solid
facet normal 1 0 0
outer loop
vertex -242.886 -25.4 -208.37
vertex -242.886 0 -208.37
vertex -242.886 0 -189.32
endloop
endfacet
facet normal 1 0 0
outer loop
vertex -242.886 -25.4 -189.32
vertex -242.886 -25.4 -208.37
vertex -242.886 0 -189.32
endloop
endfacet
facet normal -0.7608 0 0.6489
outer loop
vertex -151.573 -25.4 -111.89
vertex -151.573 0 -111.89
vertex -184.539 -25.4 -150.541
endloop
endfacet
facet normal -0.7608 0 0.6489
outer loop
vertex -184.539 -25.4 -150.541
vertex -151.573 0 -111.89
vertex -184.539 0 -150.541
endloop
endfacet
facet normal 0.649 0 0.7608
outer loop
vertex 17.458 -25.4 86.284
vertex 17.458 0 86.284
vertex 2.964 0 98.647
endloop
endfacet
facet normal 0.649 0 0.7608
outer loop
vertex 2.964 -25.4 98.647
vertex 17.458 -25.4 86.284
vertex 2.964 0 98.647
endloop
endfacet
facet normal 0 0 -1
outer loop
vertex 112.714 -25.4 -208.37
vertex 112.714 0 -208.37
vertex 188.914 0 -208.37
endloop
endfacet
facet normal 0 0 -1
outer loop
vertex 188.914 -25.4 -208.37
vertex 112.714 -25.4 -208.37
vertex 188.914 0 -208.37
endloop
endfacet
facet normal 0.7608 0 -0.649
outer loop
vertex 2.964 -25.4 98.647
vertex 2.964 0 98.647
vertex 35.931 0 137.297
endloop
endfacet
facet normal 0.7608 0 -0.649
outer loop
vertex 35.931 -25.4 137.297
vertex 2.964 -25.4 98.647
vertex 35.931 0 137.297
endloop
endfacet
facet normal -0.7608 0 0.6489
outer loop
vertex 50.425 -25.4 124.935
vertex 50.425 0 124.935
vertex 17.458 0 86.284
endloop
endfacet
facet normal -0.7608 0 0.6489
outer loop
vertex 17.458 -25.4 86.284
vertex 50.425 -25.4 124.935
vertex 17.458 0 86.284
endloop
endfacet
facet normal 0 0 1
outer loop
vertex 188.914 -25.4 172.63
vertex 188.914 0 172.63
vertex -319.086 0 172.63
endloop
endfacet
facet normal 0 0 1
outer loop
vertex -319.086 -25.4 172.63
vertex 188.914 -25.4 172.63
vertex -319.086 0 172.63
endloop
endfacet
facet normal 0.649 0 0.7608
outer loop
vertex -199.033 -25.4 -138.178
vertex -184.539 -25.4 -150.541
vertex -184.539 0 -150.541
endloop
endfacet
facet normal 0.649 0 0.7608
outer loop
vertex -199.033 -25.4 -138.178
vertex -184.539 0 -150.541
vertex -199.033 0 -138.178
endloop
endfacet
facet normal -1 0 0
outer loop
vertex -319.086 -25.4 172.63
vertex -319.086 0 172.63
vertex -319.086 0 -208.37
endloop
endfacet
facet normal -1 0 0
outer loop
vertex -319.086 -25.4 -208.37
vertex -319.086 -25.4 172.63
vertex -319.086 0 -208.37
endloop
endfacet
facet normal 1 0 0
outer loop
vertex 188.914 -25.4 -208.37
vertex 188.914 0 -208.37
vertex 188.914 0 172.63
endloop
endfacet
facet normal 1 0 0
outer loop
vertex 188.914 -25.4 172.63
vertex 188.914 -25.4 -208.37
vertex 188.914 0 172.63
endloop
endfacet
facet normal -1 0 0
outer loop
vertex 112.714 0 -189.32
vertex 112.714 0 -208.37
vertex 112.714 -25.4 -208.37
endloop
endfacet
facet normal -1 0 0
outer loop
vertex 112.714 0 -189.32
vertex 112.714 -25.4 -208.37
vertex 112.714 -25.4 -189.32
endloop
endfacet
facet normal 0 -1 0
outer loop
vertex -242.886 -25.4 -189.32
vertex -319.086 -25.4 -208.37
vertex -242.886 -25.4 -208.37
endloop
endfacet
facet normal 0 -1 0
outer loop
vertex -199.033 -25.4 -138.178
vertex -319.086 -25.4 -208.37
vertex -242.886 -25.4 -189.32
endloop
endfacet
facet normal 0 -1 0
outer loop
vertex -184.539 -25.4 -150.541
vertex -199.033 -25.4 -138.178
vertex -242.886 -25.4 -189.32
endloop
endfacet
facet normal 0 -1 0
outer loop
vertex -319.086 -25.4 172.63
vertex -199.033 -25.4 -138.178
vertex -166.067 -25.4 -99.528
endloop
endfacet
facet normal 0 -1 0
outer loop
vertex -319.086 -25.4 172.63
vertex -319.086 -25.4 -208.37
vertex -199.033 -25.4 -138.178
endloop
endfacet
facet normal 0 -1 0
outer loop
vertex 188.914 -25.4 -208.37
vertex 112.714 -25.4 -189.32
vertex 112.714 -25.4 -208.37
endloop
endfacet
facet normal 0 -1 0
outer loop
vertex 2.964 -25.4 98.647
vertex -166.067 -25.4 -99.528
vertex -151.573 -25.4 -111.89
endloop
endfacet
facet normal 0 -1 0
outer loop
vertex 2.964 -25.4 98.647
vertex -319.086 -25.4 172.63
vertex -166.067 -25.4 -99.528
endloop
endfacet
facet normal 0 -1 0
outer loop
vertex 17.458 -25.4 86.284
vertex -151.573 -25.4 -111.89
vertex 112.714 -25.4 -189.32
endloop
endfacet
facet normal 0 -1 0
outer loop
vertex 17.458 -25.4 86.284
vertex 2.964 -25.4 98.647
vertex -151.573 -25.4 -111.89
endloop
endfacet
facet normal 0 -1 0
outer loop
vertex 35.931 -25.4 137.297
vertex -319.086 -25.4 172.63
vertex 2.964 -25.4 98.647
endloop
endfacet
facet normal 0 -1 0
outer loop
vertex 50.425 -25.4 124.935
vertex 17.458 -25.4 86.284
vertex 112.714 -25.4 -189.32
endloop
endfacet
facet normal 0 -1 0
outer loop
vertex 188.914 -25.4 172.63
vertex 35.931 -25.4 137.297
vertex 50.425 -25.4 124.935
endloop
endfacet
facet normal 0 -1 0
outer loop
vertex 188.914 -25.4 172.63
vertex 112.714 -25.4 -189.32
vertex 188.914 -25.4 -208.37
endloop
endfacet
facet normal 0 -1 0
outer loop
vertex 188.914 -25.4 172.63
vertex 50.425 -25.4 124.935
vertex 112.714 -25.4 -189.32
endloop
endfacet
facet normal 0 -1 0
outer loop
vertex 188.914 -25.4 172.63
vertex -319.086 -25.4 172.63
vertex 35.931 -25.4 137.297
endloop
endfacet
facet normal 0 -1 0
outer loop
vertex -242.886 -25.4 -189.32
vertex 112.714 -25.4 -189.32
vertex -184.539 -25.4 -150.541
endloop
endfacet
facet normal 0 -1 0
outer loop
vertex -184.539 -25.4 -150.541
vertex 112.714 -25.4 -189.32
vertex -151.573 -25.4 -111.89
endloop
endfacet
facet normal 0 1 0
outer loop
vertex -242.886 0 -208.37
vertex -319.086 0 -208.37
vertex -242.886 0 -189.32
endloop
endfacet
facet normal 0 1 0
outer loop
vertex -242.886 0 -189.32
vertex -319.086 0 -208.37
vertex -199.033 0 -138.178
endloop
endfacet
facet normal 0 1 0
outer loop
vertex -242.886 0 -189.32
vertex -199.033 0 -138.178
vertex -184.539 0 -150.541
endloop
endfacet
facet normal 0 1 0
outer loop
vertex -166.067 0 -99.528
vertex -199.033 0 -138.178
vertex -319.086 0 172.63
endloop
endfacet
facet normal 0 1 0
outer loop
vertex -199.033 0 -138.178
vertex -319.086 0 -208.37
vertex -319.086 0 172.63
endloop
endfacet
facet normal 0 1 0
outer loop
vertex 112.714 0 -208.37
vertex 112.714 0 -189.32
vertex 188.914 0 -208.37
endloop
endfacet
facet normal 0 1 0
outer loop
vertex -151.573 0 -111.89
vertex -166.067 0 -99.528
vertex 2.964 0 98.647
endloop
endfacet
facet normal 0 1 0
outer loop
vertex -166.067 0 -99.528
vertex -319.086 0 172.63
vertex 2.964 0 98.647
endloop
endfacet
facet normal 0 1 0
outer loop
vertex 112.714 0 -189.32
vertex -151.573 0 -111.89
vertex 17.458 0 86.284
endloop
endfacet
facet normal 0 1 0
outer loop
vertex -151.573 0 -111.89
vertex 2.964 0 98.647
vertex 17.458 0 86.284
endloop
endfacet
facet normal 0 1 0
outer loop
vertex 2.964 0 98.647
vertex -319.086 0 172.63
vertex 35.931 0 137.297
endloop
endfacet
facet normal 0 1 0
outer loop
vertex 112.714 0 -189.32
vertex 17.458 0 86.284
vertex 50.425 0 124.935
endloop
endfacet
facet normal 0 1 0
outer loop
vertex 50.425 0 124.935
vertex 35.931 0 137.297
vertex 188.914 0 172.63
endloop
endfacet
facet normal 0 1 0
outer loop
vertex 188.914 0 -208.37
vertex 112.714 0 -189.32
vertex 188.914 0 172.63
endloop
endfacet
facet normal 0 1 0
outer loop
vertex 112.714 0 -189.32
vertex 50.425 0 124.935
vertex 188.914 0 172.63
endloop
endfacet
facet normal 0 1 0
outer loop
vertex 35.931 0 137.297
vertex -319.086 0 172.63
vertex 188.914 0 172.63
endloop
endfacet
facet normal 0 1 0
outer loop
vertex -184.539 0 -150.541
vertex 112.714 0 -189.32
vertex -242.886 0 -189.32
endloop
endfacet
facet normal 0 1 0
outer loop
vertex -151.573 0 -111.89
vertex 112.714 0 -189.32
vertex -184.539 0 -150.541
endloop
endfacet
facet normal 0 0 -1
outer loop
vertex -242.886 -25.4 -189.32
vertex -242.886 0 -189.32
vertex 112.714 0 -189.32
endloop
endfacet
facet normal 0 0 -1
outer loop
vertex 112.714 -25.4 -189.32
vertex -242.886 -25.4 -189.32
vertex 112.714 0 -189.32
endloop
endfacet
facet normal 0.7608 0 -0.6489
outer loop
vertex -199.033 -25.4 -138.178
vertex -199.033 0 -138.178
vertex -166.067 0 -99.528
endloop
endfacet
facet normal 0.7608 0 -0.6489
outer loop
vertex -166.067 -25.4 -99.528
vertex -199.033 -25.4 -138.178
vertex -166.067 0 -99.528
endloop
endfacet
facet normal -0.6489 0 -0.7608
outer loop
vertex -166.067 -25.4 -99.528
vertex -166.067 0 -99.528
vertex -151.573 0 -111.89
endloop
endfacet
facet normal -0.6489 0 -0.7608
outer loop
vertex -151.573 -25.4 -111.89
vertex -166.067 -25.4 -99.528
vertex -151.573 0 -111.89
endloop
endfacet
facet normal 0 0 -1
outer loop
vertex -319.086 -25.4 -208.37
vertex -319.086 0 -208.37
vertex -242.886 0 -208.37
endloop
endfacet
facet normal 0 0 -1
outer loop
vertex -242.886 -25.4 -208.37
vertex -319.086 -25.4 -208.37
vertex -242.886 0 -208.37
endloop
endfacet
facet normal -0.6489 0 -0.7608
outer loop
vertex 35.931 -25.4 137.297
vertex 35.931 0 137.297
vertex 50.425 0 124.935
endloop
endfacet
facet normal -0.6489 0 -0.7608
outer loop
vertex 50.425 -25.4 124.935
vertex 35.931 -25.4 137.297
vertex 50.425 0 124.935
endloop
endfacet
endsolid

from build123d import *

# Parameters (mm, degrees)
F0_W     = 76.2
F0_H     = 19.05
F1_DEPTH = 25.4


with BuildPart() as f1:
    # F0 (on Front) → F1 (new body)
    with BuildSketch(Plane.XZ):
        Polygon((188.914097, 172.629672), (-319.085903, 172.629672), (-319.085903, -189.320328), (-242.885903, -189.320328), (112.714097, -189.320328), (188.914097, -189.320328), align=None)
        Polygon((-166.066591, -99.527862), (-151.572697, -111.890287), (-184.539165, -150.540669), (-199.033058, -138.178244), align=None, mode=Mode.SUBTRACT)
        Polygon((2.964357, 98.646563), (35.930825, 137.296945), (50.424718, 124.93452), (17.458251, 86.284138), align=None, mode=Mode.SUBTRACT)
        with Locations((-280.985903, -198.845328)):
            Rectangle(F0_W, F0_H)
        with Locations((150.814097, -198.845328)):
            Rectangle(F0_W, F0_H)
    extrude(amount=F1_DEPTH)


solid = f1.part
